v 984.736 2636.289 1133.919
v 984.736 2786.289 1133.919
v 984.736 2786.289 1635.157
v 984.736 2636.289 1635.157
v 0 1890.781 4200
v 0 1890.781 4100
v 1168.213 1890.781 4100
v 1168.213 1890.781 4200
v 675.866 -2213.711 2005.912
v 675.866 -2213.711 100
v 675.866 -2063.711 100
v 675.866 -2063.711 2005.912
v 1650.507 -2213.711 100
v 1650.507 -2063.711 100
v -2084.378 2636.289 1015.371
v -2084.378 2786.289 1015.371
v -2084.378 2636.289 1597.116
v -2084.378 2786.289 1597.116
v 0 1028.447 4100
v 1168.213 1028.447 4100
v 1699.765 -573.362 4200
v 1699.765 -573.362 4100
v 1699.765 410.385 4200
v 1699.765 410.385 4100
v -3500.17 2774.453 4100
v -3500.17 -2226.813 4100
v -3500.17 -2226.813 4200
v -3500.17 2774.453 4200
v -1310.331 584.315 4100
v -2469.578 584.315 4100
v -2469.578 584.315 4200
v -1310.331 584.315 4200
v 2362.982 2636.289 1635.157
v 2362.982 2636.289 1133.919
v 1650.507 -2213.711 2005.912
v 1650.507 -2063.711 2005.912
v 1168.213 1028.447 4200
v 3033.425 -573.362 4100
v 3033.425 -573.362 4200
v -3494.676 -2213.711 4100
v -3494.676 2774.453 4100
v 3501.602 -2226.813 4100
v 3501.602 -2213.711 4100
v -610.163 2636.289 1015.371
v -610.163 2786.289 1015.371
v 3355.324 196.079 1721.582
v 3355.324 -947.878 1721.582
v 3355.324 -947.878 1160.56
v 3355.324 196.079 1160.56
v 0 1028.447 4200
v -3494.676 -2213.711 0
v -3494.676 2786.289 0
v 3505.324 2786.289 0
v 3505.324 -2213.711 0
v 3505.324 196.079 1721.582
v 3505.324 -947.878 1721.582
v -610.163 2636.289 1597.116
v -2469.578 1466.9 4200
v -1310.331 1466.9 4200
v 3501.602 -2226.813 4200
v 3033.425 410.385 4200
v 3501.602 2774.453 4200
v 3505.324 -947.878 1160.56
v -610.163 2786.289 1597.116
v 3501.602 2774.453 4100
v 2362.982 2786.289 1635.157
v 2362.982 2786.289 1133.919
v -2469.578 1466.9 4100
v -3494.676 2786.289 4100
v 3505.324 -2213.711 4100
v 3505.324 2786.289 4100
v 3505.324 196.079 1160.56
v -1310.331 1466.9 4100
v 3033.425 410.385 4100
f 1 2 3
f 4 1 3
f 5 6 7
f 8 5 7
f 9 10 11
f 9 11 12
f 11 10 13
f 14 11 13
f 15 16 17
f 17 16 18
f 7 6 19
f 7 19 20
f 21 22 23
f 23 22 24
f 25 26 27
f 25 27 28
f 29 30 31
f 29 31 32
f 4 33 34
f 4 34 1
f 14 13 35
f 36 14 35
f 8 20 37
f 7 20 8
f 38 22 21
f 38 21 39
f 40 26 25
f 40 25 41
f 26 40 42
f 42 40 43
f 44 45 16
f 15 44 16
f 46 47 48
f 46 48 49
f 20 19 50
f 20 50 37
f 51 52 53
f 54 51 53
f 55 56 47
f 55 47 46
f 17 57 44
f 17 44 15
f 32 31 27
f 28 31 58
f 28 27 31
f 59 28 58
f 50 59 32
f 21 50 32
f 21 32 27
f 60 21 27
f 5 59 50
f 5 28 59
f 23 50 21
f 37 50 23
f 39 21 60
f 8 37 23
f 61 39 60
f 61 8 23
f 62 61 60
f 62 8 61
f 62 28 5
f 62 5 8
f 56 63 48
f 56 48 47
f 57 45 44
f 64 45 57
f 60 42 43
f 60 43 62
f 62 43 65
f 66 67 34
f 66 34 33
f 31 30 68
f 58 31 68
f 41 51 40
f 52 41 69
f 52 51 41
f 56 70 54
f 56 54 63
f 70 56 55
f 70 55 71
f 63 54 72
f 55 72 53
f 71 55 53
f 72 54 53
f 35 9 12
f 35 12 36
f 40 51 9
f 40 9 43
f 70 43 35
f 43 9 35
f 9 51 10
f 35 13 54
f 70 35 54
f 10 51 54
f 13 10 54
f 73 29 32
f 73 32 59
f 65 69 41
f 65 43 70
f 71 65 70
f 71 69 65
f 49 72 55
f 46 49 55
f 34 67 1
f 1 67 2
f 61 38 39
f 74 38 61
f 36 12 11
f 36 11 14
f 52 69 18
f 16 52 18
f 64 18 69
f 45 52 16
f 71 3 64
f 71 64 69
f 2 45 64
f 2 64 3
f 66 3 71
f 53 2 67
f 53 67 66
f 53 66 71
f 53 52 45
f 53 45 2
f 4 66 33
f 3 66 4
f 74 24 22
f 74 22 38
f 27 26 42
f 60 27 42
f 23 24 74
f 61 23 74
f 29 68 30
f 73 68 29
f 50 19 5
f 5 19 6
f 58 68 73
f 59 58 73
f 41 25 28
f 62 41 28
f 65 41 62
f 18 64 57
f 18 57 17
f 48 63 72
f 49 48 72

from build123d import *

# Parameters (mm, degrees)
F0_W      = 7000
F0_H      = 5000
F1_DEPTH  = 4100
F3_W      = 7001.7721652985
F3_H      = 5001.2657642365
F4_DEPTH  = 100
F5_W      = 1159.2469215393
F5_H      = 882.5842142105
F5_W_2    = 1168.2131290436
F5_H_2    = 862.3332977295
F5_W_3    = 1333.6598873138
F5_H_3    = 983.7473630905
F6_DEPTH  = 150
F7_W      = 1143.9567655325
F7_H      = 561.0218048096
F8_DEPTH  = 150
F9_W      = 1378.2457113266
F9_H      = 501.2377500534
F9_W_2    = 1474.2147922516
F9_H_2    = 581.7452669144
F10_DEPTH = 150
F11_W     = 974.6417999268
F11_H     = 1905.9120416641
F12_DEPTH = 150


with BuildPart() as f1:
    # F0 (on Top) → F1 (new body)
    with BuildSketch(Plane.XY):
        with Locations((5.3243301809, 286.2890493809)):
            Rectangle(F0_W, F0_H)
    extrude(amount=F1_DEPTH)

    # F3 (on 3pt) → F4 (join)
    with BuildSketch(Plane.XY.offset(4100)):
        with Locations((0.7160902023, 273.8202810287)):
            Rectangle(F3_W, F3_H)
    extrude(amount=F4_DEPTH)

    # F5 (on 3pt) → F6 (cut)
    with BuildSketch(Plane.XY.offset(4100)):
        with Locations((-1889.9548053741, 1025.607407093)):
            Rectangle(F5_W, F5_H)
        with Locations((584.1065645218, 1459.6139192581)):
            Rectangle(F5_W_2, F5_H_2)
        with Locations((2366.5949106216, -81.4886689186)):
            Rectangle(F5_W_3, F5_H_3)
    extrude(amount=F6_DEPTH, mode=Mode.SUBTRACT)

    # F7 (on face) → F8 (cut)
    with BuildSketch(Plane.YZ.offset(3505.3243301809)):
        with Locations((-375.899143517, 1441.0707950592)):
            Rectangle(F7_W, F7_H)
    extrude(amount=-F8_DEPTH, mode=Mode.SUBTRACT)

    # F9 (on face) → F10 (cut)
    with BuildSketch(Plane(origin=(0, 2786.2890493809, 0), x_dir=(-1, 0, 0), z_dir=(0, 1, 0))):
        with Locations((-1673.8589406013, 1384.5381140709)):
            Rectangle(F9_W, F9_H)
        with Locations((1347.2708463669, 1306.2437176704)):
            Rectangle(F9_W_2, F9_H_2)
    extrude(amount=-F10_DEPTH, mode=Mode.SUBTRACT)

    # F11 (on face) → F12 (cut)
    with BuildSketch(Plane.XZ.offset(2213.7109506191)):
        with Locations((1163.1864309311, 1052.9560208321)):
            Rectangle(F11_W, F11_H)
    extrude(amount=-F12_DEPTH, mode=Mode.SUBTRACT)


solid = f1.part
